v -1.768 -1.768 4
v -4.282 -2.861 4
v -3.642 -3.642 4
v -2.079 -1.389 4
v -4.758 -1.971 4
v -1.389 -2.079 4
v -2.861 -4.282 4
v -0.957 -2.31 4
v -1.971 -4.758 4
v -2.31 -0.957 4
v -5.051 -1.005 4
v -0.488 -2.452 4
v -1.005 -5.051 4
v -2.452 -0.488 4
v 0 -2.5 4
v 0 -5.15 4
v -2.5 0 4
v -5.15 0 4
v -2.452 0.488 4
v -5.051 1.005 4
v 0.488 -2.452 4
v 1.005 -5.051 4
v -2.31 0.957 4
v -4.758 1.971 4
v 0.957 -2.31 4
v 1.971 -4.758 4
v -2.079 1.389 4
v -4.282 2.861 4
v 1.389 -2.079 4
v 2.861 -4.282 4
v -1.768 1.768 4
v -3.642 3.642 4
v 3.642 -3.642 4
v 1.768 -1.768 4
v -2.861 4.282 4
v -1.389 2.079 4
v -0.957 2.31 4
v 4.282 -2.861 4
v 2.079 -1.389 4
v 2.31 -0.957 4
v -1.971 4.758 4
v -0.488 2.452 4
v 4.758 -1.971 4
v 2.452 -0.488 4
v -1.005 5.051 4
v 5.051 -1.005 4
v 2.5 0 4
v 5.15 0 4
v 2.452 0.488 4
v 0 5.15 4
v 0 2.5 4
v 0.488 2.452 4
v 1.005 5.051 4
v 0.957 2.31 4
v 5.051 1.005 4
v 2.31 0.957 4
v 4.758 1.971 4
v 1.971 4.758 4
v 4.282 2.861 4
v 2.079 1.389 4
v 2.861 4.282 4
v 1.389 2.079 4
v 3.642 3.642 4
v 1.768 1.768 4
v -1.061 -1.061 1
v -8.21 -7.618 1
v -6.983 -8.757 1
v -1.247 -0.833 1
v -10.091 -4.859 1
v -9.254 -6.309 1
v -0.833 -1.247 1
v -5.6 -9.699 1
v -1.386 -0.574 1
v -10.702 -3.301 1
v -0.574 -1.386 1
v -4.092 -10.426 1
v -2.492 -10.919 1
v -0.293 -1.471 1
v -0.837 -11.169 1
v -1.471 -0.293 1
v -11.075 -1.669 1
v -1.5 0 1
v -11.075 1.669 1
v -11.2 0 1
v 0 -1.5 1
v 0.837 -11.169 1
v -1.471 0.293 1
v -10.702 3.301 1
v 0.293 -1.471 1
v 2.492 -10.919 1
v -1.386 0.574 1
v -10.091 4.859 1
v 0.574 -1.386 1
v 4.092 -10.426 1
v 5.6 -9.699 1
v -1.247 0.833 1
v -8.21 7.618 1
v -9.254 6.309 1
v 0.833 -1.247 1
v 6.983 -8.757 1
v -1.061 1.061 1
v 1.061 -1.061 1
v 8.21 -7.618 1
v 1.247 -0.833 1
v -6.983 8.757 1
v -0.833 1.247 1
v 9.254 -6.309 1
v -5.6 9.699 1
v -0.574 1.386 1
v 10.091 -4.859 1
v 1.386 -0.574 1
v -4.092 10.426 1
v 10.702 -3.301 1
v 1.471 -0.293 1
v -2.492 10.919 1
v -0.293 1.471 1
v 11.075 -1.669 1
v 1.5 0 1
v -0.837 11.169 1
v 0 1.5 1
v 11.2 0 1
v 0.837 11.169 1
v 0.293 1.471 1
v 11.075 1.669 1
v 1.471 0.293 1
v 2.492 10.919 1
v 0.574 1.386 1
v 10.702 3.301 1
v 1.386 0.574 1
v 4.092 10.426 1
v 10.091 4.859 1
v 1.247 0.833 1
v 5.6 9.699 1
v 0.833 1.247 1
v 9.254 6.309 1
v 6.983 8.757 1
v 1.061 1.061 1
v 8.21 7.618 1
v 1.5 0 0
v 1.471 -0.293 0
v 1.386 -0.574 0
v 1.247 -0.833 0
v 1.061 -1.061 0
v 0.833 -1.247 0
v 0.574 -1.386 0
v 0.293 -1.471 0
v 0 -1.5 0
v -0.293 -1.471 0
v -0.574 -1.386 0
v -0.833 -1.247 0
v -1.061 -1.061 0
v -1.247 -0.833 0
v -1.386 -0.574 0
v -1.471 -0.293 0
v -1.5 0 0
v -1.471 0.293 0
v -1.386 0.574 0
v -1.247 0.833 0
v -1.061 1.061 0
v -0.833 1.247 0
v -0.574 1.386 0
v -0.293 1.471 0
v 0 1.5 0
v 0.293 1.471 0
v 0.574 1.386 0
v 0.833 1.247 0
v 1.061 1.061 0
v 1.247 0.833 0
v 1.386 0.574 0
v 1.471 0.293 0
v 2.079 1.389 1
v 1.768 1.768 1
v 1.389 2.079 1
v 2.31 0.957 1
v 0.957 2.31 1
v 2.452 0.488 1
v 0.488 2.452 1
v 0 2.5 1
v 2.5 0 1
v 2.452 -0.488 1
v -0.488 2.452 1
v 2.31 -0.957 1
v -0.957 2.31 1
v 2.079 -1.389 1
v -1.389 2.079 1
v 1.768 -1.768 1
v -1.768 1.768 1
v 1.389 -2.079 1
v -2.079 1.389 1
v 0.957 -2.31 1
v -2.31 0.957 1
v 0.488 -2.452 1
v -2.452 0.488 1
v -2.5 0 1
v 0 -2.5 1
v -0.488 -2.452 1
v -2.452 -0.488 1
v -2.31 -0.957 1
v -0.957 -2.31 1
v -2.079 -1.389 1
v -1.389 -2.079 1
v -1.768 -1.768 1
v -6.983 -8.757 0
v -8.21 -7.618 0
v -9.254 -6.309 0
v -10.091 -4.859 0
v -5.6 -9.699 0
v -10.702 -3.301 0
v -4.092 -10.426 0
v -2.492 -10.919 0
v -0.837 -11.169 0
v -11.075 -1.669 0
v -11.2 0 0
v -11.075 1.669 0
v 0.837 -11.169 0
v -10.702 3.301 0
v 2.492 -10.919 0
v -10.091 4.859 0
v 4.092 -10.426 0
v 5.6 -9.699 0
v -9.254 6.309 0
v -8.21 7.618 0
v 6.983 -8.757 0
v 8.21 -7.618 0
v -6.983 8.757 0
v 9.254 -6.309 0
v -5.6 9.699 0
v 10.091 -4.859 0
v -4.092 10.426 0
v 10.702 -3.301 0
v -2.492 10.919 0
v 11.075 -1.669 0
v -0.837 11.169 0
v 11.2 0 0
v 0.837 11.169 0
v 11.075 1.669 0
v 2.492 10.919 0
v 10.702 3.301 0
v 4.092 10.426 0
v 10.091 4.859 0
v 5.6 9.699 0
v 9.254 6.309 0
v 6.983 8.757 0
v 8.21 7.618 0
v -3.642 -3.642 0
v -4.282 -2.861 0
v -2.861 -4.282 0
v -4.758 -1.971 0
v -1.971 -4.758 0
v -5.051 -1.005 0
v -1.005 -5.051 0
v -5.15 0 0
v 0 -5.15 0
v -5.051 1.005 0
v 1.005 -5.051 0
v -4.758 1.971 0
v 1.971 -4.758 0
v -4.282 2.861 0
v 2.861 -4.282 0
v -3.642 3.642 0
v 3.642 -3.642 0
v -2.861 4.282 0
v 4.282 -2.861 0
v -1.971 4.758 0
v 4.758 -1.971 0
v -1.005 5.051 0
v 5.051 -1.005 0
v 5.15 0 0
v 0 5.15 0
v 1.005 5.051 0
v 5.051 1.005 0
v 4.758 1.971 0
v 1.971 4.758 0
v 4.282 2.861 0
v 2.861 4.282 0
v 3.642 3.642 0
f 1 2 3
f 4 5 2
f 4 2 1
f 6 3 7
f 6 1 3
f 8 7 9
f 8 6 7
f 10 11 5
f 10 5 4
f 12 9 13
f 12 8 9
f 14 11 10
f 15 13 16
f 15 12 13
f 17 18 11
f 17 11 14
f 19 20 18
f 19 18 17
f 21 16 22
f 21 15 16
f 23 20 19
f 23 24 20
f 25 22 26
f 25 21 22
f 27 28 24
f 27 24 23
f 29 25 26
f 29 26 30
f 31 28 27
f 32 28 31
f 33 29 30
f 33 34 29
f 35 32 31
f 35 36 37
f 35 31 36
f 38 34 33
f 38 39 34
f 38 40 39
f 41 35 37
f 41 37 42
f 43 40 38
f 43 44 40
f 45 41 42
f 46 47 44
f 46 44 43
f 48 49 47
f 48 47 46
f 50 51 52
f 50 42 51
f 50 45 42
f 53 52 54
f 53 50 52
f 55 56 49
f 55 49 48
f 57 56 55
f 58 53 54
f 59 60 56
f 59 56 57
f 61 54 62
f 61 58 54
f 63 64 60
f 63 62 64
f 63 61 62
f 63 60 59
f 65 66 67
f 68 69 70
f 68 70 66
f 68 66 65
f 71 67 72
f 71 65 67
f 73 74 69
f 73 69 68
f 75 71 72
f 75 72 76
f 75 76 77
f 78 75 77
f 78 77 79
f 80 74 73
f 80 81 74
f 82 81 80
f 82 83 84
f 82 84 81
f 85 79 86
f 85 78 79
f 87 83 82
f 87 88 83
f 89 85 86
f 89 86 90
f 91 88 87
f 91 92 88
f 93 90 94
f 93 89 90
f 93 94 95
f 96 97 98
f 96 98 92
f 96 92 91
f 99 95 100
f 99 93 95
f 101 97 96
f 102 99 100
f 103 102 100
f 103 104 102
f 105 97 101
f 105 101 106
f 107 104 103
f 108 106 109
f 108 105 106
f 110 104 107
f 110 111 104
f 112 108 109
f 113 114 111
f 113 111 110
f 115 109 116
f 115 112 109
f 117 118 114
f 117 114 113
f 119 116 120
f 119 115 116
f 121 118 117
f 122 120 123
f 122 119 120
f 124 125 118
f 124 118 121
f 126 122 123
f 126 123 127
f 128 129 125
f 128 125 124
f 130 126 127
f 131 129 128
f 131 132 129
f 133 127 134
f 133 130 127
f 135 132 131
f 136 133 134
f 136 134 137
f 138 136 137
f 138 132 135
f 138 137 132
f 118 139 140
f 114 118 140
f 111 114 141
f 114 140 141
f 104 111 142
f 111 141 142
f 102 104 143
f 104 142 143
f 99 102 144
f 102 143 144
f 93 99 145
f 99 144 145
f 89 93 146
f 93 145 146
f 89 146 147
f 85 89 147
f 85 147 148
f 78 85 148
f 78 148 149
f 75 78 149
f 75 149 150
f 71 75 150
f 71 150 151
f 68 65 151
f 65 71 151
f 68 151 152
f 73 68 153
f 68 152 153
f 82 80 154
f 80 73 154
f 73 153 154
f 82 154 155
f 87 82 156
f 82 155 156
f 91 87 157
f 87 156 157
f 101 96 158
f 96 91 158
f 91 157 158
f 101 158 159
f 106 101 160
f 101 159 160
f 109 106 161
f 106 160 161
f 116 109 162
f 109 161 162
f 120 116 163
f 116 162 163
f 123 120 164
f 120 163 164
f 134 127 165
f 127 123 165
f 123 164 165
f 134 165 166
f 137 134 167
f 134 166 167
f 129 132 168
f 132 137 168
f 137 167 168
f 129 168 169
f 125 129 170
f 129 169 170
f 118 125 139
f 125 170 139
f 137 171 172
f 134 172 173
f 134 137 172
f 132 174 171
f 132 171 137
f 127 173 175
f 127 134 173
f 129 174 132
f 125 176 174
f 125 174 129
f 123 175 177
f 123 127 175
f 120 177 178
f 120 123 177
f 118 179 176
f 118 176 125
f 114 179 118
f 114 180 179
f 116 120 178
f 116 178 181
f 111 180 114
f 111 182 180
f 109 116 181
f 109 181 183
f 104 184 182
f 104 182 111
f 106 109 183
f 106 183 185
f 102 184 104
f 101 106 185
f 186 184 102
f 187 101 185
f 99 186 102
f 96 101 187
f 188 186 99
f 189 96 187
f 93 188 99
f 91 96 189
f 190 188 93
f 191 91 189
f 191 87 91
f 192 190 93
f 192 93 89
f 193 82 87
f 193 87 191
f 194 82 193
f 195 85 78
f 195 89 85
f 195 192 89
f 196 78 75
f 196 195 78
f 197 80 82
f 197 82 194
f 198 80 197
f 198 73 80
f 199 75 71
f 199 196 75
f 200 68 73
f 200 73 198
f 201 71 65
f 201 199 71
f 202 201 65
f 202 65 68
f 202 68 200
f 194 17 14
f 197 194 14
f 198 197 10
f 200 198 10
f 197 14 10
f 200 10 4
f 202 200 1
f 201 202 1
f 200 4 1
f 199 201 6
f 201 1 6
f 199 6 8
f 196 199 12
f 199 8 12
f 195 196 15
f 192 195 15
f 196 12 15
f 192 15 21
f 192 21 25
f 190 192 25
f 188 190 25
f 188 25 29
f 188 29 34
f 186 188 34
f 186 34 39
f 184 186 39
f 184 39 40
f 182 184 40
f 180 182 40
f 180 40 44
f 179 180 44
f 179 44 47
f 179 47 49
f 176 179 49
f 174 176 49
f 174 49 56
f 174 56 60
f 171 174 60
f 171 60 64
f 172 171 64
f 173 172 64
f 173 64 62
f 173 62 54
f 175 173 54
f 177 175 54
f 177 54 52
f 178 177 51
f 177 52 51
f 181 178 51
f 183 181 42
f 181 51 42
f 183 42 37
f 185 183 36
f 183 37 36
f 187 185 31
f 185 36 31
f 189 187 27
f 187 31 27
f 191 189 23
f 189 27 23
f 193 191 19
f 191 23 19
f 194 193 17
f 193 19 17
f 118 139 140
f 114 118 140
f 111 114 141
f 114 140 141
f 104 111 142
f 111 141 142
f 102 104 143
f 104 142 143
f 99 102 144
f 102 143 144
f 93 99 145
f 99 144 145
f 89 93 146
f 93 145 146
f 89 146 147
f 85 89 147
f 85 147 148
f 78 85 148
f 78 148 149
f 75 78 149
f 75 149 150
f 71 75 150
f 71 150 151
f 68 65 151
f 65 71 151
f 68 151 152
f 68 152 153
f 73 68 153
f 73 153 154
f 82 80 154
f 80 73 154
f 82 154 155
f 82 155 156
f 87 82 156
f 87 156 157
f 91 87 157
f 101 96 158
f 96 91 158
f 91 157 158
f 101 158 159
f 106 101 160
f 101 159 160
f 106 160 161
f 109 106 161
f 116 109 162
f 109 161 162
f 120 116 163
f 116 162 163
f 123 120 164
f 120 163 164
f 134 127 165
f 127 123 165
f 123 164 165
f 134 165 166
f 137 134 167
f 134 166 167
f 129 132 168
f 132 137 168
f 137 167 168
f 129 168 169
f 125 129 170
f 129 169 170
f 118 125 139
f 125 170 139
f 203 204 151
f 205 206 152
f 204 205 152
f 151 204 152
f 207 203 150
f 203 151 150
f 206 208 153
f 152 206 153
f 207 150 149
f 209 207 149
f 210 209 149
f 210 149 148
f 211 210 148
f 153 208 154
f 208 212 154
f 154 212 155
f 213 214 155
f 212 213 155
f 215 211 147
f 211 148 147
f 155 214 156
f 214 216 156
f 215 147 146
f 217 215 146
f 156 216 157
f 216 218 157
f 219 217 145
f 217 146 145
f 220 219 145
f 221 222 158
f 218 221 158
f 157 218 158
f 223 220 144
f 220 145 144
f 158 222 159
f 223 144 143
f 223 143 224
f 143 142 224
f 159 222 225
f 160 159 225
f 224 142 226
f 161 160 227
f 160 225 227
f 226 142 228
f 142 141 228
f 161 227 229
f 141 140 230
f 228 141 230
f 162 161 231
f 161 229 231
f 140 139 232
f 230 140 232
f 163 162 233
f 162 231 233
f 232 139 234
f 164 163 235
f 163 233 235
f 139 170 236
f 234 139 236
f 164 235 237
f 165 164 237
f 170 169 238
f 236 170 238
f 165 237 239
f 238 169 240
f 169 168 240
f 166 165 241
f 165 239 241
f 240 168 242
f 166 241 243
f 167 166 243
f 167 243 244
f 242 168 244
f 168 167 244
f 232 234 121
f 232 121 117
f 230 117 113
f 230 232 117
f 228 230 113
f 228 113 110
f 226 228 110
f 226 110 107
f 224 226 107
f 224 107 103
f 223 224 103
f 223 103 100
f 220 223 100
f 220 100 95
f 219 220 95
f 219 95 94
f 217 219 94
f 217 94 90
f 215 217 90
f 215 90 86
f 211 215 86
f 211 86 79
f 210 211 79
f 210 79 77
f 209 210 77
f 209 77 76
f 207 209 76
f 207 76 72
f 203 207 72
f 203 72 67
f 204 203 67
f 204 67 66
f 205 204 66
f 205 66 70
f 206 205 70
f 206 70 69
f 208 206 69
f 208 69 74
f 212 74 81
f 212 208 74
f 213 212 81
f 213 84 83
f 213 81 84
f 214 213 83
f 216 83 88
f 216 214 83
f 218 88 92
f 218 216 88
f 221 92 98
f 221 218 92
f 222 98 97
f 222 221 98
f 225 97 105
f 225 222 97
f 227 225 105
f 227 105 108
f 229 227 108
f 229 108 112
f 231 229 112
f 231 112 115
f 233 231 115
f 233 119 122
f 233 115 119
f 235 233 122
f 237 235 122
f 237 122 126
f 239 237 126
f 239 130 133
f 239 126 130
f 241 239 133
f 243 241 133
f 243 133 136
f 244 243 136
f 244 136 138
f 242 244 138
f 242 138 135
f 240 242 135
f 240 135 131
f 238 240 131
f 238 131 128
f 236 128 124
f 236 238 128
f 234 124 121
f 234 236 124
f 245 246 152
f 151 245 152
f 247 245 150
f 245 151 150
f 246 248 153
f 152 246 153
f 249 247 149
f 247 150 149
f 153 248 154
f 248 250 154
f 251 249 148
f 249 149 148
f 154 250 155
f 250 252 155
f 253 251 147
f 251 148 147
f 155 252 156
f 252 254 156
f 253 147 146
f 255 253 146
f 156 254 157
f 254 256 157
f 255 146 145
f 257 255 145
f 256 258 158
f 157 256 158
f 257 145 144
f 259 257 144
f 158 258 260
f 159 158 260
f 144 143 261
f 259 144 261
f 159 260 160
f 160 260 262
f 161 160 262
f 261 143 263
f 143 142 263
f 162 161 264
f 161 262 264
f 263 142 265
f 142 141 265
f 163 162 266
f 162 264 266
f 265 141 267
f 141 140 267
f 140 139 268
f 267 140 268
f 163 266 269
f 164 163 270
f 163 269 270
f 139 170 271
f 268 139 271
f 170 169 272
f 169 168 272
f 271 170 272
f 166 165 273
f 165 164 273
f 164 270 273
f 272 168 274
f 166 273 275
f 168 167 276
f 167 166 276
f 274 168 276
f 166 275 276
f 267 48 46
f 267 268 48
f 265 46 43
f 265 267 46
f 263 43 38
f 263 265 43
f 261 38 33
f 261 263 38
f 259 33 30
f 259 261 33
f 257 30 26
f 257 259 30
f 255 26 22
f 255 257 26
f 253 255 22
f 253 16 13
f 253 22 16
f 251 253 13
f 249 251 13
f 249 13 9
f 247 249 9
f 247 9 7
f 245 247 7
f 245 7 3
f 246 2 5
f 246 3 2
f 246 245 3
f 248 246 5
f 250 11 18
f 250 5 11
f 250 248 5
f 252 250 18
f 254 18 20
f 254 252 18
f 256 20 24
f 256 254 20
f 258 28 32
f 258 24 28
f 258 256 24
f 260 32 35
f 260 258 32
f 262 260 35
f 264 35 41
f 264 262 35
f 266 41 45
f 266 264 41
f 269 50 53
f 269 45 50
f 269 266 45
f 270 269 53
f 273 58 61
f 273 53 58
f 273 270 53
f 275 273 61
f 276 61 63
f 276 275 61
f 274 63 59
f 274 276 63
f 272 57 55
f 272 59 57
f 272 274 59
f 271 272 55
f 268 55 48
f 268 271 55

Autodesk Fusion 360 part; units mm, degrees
sketch "Sketch1" plane through (0, 0, 0) normal (0, 0, 1) x (1, 0, 0)
  circle A0 centre (0, 0) radius 11.2
  circle A1 centre (0, 0) radius 5.15
  circle A2 centre (0, 0) radius 1.5
  dimension "d1" = 22.4
  dimension "d2" = 10.3
  dimension "d3" = 3
extrude "Extrude1" add sketch "Sketch1" along normal blind 1 contours A0 | A1 makes body 1
extrude "Extrude2" add sketch "Sketch1" along normal blind 4 separate body contours A1 makes body 2
sketch "Sketch2" plane through (0, 0, 4) normal (0, 0, 1) x (-1, 0, 0)
  circle A0 centre (0, 0) radius 1.5
  circle A1 centre (0, 0) radius 5.15
  circle A2 centre (0, 0) radius 2.5
  dimension "d8" = 5
extrude "Extrude3" cut sketch "Sketch2" against normal blind 3 contours A2 bodies 2
